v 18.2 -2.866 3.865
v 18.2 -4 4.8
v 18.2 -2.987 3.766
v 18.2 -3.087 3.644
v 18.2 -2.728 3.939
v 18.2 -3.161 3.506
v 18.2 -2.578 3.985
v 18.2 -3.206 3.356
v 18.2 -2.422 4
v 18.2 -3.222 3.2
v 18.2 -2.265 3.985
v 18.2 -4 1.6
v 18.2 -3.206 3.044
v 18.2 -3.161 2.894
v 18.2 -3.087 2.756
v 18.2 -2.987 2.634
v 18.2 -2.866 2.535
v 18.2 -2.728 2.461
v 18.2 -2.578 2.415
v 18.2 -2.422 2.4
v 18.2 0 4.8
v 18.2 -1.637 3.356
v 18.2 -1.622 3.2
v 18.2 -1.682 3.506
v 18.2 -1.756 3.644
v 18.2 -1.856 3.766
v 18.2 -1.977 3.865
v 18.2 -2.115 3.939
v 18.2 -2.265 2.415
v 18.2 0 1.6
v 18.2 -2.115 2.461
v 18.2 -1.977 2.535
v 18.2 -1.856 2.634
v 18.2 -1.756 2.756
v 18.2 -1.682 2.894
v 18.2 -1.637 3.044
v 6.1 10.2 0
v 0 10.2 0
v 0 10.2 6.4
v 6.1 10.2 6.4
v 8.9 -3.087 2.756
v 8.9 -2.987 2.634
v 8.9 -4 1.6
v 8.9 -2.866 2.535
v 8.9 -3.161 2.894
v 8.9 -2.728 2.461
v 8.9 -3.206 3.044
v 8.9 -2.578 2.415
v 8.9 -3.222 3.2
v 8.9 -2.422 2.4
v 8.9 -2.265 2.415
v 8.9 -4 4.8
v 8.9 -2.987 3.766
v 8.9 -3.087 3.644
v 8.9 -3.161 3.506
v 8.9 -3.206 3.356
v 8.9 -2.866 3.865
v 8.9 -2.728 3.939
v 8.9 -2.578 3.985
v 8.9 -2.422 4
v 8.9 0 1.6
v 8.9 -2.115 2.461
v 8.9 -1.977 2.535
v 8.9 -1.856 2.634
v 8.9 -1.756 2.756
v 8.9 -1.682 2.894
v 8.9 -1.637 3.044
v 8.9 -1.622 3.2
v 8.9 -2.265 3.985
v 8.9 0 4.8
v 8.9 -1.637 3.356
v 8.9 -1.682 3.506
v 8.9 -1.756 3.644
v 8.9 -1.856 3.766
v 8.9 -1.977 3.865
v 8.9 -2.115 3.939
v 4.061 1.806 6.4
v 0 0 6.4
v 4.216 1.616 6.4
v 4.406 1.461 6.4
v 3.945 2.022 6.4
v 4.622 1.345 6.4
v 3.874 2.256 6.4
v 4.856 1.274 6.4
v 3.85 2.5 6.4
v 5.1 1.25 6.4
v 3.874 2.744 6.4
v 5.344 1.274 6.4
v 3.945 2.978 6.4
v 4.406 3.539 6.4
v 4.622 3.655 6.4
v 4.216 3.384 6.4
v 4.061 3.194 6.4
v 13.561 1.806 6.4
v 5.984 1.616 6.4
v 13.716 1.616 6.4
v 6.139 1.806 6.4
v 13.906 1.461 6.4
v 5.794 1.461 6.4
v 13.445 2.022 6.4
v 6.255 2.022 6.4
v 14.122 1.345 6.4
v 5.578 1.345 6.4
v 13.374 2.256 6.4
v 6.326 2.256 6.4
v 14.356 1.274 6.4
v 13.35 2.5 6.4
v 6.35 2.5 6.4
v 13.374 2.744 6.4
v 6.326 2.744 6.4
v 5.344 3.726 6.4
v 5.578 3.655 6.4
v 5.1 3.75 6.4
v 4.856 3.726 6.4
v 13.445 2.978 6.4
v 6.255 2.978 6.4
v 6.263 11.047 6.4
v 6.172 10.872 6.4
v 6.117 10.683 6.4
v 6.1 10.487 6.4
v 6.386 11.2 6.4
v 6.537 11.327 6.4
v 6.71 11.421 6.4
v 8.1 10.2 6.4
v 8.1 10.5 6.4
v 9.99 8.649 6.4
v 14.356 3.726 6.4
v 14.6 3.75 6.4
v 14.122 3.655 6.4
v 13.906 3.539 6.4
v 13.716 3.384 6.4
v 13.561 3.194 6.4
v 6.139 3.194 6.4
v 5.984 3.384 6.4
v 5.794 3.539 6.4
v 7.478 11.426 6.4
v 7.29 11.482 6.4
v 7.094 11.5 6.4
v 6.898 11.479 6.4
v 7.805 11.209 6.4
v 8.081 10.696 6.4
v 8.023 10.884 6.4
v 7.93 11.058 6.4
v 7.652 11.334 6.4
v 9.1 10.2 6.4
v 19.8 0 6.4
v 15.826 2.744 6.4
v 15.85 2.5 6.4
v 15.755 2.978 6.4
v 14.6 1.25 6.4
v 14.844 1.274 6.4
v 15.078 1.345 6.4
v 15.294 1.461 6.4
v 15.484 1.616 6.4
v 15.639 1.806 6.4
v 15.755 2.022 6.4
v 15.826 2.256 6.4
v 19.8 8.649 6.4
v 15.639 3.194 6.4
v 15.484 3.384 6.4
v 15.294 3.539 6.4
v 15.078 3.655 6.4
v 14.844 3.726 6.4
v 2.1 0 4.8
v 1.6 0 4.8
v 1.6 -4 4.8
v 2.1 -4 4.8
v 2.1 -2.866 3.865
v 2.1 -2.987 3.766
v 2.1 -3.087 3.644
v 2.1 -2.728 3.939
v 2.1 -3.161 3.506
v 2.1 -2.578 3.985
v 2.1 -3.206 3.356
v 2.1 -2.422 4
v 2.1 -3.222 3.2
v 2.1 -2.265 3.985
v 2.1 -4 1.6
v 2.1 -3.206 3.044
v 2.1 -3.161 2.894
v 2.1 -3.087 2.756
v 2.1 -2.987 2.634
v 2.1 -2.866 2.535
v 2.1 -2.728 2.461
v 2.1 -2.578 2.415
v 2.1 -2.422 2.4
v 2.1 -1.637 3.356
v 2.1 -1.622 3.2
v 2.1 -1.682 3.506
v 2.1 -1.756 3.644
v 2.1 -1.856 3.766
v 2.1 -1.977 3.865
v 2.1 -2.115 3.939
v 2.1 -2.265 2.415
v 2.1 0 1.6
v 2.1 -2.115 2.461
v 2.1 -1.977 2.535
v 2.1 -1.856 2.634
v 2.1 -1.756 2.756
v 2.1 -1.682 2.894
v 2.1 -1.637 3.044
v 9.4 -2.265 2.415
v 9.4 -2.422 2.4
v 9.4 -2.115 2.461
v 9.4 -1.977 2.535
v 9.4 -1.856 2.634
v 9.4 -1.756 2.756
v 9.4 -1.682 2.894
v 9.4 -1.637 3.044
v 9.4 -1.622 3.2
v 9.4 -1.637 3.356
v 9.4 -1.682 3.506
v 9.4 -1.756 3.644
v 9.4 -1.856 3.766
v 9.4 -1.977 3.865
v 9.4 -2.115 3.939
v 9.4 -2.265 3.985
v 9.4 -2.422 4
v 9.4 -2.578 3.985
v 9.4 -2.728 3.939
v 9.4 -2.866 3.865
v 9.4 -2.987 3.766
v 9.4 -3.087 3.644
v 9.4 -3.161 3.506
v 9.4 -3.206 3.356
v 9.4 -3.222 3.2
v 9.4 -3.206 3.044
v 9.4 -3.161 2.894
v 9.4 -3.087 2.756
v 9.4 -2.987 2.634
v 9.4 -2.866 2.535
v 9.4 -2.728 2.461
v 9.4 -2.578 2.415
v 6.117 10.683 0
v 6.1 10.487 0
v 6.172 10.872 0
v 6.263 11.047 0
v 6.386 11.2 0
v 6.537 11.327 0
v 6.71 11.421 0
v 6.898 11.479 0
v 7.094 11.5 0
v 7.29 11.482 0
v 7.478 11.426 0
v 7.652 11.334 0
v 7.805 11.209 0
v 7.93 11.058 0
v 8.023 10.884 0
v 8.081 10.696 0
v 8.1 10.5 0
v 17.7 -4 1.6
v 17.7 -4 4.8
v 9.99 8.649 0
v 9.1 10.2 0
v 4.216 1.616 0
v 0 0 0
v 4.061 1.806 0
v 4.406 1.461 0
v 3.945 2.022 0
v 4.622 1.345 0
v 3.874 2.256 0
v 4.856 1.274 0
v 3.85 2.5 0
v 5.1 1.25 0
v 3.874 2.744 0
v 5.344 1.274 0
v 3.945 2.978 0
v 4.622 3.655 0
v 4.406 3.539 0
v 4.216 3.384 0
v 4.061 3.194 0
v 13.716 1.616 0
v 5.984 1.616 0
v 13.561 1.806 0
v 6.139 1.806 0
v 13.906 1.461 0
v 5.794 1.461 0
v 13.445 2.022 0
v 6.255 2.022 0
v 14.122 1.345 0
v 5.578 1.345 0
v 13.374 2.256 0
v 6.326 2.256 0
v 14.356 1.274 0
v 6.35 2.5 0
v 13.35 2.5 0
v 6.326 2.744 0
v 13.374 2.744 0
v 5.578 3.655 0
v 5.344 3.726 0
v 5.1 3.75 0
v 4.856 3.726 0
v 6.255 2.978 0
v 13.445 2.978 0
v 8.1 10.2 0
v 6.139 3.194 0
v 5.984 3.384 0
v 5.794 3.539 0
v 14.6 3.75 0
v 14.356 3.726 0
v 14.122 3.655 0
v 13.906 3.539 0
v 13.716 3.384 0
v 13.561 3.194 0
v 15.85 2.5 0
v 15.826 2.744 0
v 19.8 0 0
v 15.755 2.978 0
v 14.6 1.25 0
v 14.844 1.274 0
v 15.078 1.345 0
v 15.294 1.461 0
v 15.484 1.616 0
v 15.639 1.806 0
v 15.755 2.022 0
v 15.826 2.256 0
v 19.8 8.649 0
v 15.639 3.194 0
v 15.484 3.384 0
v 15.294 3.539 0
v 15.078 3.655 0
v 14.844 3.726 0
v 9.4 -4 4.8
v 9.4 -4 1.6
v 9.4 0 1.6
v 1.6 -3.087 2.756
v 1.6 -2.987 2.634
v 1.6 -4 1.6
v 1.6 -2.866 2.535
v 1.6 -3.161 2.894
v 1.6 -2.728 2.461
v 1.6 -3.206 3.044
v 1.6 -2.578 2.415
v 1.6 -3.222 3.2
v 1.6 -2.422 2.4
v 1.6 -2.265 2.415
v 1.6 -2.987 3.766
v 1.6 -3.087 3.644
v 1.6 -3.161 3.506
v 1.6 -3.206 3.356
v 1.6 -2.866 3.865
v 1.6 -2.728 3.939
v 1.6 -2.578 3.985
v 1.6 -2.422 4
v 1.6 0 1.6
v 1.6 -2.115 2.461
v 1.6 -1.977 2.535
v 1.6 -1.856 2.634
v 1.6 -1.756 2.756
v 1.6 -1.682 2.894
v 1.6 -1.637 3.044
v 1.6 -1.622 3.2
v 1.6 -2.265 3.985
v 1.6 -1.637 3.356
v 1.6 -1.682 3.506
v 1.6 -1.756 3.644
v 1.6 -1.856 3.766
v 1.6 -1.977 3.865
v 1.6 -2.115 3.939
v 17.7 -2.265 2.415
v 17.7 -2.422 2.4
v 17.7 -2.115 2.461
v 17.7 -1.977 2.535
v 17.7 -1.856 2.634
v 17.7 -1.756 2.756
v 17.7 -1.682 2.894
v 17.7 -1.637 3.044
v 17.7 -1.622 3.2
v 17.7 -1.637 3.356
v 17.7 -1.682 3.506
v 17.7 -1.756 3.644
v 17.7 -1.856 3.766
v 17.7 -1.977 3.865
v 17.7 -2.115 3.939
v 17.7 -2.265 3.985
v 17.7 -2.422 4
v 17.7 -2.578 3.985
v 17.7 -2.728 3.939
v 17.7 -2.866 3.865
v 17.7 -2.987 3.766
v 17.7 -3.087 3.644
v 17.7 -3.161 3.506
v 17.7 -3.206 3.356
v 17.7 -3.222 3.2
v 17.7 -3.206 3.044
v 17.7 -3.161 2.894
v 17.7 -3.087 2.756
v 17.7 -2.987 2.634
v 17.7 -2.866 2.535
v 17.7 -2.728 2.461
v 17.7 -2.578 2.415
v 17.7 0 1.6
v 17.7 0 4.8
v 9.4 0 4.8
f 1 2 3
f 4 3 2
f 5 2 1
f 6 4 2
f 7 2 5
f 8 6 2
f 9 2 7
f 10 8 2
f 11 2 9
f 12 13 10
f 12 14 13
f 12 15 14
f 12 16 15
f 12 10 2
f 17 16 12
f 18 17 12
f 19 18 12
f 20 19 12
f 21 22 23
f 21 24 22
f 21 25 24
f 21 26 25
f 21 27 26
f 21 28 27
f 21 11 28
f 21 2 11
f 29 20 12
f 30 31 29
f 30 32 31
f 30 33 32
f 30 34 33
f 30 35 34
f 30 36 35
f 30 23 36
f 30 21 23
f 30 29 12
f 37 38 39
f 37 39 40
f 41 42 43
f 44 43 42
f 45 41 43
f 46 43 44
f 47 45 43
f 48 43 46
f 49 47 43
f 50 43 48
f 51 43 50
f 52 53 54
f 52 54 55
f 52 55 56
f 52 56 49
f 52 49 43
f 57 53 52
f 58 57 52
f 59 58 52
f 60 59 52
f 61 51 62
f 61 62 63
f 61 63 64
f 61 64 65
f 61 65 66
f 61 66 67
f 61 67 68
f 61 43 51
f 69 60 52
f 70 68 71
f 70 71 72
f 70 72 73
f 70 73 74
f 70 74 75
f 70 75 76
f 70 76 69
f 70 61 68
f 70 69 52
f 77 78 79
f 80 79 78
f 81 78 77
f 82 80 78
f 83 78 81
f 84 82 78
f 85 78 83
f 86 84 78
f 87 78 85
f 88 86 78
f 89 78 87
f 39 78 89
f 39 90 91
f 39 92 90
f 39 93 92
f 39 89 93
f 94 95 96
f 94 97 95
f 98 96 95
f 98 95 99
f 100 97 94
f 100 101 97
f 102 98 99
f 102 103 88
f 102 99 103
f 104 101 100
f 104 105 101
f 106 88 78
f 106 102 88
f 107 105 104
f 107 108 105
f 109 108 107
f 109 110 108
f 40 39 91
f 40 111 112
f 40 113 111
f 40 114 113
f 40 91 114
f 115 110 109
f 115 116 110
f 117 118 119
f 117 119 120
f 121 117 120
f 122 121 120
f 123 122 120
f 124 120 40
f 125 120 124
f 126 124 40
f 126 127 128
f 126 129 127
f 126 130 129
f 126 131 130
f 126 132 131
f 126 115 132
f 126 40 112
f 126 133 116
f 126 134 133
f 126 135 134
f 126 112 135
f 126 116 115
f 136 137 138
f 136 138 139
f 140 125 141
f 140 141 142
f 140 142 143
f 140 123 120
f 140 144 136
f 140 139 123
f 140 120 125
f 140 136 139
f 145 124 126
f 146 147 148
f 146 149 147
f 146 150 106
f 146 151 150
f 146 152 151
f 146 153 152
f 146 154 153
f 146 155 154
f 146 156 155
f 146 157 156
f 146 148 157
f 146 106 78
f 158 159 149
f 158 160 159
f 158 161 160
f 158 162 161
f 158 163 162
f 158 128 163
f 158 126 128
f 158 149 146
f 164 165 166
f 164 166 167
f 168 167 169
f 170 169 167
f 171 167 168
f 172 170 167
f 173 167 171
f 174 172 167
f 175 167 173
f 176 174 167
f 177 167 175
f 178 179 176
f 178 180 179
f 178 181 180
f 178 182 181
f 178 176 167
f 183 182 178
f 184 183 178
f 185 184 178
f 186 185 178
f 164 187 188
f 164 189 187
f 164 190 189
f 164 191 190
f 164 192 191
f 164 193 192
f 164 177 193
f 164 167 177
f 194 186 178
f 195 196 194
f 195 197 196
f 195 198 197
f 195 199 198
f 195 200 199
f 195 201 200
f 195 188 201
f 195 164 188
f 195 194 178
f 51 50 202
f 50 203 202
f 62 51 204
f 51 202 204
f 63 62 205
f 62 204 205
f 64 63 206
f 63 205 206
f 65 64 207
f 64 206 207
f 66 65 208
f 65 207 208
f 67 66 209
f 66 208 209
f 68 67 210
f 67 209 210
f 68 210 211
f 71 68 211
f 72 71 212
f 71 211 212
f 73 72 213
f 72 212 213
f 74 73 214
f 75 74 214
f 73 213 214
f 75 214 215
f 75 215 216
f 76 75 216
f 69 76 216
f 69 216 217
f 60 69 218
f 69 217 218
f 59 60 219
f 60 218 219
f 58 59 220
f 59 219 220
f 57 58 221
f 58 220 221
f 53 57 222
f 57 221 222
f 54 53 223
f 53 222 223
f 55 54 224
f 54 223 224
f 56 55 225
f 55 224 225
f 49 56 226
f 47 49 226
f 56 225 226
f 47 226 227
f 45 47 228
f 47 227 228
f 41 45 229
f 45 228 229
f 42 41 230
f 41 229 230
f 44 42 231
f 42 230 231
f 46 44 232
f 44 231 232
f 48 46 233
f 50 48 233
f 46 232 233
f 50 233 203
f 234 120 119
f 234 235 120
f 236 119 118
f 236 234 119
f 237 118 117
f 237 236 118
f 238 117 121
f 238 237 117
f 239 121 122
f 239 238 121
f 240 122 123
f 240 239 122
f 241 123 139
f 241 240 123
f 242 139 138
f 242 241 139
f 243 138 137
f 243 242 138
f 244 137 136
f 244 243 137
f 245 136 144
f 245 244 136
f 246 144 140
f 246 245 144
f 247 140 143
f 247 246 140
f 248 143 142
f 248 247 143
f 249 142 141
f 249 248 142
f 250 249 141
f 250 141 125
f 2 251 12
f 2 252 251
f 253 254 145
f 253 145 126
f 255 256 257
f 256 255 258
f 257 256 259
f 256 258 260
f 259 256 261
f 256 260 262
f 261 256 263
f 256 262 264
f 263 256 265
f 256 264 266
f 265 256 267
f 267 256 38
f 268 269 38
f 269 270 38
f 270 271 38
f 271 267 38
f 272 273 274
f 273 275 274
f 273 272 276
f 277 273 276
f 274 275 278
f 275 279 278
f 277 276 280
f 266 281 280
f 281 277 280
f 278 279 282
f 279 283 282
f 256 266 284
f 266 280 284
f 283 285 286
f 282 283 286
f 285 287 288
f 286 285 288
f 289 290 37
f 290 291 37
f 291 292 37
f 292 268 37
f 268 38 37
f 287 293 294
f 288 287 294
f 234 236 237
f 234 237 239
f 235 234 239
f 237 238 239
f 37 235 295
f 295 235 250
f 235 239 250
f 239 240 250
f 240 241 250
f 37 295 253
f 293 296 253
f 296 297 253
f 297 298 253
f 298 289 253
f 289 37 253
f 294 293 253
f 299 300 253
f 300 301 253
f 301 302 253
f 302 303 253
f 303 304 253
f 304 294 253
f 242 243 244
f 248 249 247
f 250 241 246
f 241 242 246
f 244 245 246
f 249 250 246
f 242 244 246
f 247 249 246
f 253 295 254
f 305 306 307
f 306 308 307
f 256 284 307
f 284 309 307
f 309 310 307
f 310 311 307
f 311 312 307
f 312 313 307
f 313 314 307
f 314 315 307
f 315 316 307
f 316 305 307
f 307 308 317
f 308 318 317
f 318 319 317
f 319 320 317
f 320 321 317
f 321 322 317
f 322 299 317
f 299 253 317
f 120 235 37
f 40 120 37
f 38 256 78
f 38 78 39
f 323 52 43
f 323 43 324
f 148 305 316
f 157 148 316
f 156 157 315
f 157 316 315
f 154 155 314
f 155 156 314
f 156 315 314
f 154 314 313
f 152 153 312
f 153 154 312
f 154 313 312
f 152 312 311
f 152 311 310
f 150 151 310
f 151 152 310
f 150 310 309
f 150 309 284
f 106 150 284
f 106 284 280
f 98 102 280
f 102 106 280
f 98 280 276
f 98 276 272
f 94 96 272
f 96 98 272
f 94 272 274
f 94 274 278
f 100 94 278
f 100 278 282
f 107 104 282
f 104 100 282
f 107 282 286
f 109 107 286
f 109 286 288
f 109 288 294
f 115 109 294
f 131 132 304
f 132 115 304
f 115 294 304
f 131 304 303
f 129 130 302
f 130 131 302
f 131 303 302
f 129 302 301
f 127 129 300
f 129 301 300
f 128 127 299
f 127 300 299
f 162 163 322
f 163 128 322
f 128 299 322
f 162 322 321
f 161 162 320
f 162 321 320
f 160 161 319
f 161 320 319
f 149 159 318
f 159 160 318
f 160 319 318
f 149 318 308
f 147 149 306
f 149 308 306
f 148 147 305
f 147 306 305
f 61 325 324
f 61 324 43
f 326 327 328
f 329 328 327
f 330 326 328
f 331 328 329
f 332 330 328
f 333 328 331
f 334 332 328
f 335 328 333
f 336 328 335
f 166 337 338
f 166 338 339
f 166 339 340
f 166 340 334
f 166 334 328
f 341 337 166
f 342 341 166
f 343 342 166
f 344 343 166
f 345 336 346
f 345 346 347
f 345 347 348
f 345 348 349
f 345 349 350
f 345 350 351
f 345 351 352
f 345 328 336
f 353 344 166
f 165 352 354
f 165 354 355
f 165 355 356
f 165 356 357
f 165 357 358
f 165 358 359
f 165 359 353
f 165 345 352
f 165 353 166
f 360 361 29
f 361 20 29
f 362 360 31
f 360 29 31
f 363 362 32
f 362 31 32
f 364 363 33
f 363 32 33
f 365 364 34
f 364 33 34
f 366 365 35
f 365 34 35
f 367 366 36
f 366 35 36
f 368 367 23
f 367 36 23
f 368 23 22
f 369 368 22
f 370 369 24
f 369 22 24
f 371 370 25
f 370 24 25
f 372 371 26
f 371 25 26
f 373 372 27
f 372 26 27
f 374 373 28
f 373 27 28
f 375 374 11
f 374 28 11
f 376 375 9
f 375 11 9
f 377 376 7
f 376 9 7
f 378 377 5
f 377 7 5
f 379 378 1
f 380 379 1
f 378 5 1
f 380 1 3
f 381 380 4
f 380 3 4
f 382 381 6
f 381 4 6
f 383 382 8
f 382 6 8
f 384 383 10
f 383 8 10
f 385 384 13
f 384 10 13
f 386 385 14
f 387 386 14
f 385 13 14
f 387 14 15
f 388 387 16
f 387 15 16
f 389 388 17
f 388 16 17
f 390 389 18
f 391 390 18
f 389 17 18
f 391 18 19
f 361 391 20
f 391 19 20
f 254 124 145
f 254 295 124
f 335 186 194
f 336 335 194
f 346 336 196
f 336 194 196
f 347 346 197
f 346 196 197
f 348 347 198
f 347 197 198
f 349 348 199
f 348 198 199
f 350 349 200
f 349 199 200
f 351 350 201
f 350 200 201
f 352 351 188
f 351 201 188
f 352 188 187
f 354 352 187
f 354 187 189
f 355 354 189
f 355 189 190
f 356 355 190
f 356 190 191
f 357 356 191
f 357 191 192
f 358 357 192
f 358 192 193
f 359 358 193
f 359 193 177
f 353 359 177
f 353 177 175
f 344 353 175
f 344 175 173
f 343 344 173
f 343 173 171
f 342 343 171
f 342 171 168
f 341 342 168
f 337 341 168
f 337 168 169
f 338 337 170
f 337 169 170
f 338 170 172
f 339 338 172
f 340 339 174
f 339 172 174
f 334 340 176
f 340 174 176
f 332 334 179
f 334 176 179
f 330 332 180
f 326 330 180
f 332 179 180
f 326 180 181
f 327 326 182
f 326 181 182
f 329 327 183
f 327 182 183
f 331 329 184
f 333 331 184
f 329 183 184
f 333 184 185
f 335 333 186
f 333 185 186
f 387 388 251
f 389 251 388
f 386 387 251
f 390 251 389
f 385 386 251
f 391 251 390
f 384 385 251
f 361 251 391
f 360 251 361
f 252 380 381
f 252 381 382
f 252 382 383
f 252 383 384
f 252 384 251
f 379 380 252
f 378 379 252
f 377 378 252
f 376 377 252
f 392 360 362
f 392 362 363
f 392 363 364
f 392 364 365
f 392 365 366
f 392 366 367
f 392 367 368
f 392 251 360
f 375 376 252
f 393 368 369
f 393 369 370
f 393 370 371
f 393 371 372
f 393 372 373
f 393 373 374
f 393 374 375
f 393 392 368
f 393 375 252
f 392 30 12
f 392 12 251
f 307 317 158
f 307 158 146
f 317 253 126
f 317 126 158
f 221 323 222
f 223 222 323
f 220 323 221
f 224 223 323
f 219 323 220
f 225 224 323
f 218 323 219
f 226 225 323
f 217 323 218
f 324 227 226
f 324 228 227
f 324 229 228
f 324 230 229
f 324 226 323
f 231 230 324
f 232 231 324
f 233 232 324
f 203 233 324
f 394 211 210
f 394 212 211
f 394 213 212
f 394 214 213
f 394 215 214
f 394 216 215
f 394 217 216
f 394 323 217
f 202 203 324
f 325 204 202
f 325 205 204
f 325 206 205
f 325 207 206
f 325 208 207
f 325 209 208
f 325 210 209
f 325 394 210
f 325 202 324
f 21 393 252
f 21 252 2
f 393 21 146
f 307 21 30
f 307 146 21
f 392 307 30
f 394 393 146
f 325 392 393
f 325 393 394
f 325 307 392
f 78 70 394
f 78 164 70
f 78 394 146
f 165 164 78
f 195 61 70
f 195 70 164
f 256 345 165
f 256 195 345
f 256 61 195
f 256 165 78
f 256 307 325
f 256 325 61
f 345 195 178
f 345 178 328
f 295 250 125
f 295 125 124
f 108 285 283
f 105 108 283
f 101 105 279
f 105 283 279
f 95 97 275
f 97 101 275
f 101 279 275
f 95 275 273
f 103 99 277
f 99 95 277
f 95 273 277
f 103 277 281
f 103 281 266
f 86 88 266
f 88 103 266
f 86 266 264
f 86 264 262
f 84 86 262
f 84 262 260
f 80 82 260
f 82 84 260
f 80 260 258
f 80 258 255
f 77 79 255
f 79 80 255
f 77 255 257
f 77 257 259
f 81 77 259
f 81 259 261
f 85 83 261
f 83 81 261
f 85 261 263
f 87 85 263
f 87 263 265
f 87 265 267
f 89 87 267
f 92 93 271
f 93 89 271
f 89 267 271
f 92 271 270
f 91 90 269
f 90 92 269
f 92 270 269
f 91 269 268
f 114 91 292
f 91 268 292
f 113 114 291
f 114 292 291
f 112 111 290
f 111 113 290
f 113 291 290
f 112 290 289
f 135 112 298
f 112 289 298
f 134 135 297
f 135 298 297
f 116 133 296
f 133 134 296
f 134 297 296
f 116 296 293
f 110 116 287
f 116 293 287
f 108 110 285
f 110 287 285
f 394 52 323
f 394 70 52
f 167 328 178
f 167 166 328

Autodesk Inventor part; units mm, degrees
ref_plane "YZ Plane" through (0, 0, 0) normal (1, 0, 0) x (0, 1, 0)
ref_plane "XZ Plane" through (0, 0, 0) normal (0, 1, 0) x (-1, 0, 0)
ref_plane "XY Plane" through (0, 0, 0) normal (0, 0, 1) x (1, 0, 0)
sketch "Sketch1" plane through (0, 0, 0) normal (0, 0, 1) x (1, 0, 0)
  line L0 (0, 0) -> (0, 10.2)
  line L1 (0, 10.2) -> (9.1, 10.2)
  line L2 (9.1, 10.2) -> (9.99, 8.6487)
  line L3 (9.99, 8.6487) -> (19.8, 8.6487)
  line L4 (19.8, 8.6487) -> (19.8, 0)
  line L5 (19.8, 0) -> (0, 0)
  circle A0 centre (5.1, 2.5) radius 1.25
  circle A1 centre (14.6, 2.5) radius 1.25
  arc A2 (8.1, 10.5) -> (6.1001, 10.4874) centre (7.1, 10.5) ccw
  line L6 (8.1, 10.5) -> (8.1, 10.2)
  line L7 (6.1001, 10.5) -> (6.1001, 10.2)
  dimension "d0" = 9.1
  dimension "d1" = 10.2
  dimension "d2" = 19.8
  dimension "d3" = 2.5
  dimension "d4" = 5.1
  dimension "d5" = 2.5
  dimension "d6" = 9.5
  dimension "d7" = 2.5
  dimension "d8" = 2.5
  dimension "d9" = 2
  dimension "d10" = 7.5
  dimension "d11" = 10.5
extrude "Extrusion1" add sketch "Sketch1" along normal blind 6.4
sketch "Sketch3" plane through (0, 0, 0) normal (0, -1, 0) x (1, 0, 0)
  line L0 (8.9, 1.6) -> (8.9, 4.8)
  line L1 (8.9, 4.8) -> (9.4, 4.8)
  line L2 (9.4, 4.8) -> (9.4, 1.6)
  line L3 (9.4, 1.6) -> (8.9, 1.6)
  line L4 (17.7, 1.6) -> (17.7, 4.8)
  line L5 (17.7, 4.8) -> (18.2, 4.8)
  line L6 (18.2, 4.8) -> (18.2, 1.6)
  line L7 (18.2, 1.6) -> (17.7, 1.6)
  line L8 (1.6, 1.6) -> (1.6, 4.8)
  line L9 (1.6, 4.8) -> (2.1, 4.8)
  line L10 (2.1, 4.8) -> (2.1, 1.6)
  line L11 (2.1, 1.6) -> (1.6, 1.6)
extrude "Extrusion3" add sketch "Sketch3" along normal blind 4
sketch "Sketch4" plane through (18.2, 0, 4.8) normal (1, 0, 0) x (0, 0, -1)
  circle A0 centre (1.6, -2.4215) radius 0.8
  point P0 (4.8, 0)
  dimension "d24" = 1.6
extrude "Extrusion4" cut sketch "Sketch4" against normal blind 22
sketch "Sketch2" plane through (0, 0, 6.4) normal (0, 0, 1) x (1, 0, 0)
  line L0 (1.6916, 0) -> (2.1916, 0)
  line L1 (2.1916, 0) -> (2.1916, -4)
  line L2 (2.1916, -4) -> (1.6916, -4)
  line L3 (1.6916, -4) -> (1.6916, 0)
  line L4 (10.4916, 0) -> (10.9916, 0)
  line L5 (10.9916, 0) -> (10.9916, -4)
  line L6 (10.9916, -4) -> (10.4916, -4)
  line L7 (10.4916, -4) -> (10.4916, 0)
  line L8 (17.7916, 0) -> (18.2916, 0)
  line L9 (18.2916, 0) -> (18.2916, -4)
  line L10 (18.2916, -4) -> (17.7916, -4)
  line L11 (17.7916, -4) -> (17.7916, 0)
  point P0 (0, 0)
  point P1 (-19.8, 0)
  dimension "d14" = 0.5
  dimension "d15" = 4
  dimension "d16" = 0.5
  dimension "d17" = 0.5
  dimension "d18" = 8.3
  dimension "d19" = 6.8
properties part number "endstop"
